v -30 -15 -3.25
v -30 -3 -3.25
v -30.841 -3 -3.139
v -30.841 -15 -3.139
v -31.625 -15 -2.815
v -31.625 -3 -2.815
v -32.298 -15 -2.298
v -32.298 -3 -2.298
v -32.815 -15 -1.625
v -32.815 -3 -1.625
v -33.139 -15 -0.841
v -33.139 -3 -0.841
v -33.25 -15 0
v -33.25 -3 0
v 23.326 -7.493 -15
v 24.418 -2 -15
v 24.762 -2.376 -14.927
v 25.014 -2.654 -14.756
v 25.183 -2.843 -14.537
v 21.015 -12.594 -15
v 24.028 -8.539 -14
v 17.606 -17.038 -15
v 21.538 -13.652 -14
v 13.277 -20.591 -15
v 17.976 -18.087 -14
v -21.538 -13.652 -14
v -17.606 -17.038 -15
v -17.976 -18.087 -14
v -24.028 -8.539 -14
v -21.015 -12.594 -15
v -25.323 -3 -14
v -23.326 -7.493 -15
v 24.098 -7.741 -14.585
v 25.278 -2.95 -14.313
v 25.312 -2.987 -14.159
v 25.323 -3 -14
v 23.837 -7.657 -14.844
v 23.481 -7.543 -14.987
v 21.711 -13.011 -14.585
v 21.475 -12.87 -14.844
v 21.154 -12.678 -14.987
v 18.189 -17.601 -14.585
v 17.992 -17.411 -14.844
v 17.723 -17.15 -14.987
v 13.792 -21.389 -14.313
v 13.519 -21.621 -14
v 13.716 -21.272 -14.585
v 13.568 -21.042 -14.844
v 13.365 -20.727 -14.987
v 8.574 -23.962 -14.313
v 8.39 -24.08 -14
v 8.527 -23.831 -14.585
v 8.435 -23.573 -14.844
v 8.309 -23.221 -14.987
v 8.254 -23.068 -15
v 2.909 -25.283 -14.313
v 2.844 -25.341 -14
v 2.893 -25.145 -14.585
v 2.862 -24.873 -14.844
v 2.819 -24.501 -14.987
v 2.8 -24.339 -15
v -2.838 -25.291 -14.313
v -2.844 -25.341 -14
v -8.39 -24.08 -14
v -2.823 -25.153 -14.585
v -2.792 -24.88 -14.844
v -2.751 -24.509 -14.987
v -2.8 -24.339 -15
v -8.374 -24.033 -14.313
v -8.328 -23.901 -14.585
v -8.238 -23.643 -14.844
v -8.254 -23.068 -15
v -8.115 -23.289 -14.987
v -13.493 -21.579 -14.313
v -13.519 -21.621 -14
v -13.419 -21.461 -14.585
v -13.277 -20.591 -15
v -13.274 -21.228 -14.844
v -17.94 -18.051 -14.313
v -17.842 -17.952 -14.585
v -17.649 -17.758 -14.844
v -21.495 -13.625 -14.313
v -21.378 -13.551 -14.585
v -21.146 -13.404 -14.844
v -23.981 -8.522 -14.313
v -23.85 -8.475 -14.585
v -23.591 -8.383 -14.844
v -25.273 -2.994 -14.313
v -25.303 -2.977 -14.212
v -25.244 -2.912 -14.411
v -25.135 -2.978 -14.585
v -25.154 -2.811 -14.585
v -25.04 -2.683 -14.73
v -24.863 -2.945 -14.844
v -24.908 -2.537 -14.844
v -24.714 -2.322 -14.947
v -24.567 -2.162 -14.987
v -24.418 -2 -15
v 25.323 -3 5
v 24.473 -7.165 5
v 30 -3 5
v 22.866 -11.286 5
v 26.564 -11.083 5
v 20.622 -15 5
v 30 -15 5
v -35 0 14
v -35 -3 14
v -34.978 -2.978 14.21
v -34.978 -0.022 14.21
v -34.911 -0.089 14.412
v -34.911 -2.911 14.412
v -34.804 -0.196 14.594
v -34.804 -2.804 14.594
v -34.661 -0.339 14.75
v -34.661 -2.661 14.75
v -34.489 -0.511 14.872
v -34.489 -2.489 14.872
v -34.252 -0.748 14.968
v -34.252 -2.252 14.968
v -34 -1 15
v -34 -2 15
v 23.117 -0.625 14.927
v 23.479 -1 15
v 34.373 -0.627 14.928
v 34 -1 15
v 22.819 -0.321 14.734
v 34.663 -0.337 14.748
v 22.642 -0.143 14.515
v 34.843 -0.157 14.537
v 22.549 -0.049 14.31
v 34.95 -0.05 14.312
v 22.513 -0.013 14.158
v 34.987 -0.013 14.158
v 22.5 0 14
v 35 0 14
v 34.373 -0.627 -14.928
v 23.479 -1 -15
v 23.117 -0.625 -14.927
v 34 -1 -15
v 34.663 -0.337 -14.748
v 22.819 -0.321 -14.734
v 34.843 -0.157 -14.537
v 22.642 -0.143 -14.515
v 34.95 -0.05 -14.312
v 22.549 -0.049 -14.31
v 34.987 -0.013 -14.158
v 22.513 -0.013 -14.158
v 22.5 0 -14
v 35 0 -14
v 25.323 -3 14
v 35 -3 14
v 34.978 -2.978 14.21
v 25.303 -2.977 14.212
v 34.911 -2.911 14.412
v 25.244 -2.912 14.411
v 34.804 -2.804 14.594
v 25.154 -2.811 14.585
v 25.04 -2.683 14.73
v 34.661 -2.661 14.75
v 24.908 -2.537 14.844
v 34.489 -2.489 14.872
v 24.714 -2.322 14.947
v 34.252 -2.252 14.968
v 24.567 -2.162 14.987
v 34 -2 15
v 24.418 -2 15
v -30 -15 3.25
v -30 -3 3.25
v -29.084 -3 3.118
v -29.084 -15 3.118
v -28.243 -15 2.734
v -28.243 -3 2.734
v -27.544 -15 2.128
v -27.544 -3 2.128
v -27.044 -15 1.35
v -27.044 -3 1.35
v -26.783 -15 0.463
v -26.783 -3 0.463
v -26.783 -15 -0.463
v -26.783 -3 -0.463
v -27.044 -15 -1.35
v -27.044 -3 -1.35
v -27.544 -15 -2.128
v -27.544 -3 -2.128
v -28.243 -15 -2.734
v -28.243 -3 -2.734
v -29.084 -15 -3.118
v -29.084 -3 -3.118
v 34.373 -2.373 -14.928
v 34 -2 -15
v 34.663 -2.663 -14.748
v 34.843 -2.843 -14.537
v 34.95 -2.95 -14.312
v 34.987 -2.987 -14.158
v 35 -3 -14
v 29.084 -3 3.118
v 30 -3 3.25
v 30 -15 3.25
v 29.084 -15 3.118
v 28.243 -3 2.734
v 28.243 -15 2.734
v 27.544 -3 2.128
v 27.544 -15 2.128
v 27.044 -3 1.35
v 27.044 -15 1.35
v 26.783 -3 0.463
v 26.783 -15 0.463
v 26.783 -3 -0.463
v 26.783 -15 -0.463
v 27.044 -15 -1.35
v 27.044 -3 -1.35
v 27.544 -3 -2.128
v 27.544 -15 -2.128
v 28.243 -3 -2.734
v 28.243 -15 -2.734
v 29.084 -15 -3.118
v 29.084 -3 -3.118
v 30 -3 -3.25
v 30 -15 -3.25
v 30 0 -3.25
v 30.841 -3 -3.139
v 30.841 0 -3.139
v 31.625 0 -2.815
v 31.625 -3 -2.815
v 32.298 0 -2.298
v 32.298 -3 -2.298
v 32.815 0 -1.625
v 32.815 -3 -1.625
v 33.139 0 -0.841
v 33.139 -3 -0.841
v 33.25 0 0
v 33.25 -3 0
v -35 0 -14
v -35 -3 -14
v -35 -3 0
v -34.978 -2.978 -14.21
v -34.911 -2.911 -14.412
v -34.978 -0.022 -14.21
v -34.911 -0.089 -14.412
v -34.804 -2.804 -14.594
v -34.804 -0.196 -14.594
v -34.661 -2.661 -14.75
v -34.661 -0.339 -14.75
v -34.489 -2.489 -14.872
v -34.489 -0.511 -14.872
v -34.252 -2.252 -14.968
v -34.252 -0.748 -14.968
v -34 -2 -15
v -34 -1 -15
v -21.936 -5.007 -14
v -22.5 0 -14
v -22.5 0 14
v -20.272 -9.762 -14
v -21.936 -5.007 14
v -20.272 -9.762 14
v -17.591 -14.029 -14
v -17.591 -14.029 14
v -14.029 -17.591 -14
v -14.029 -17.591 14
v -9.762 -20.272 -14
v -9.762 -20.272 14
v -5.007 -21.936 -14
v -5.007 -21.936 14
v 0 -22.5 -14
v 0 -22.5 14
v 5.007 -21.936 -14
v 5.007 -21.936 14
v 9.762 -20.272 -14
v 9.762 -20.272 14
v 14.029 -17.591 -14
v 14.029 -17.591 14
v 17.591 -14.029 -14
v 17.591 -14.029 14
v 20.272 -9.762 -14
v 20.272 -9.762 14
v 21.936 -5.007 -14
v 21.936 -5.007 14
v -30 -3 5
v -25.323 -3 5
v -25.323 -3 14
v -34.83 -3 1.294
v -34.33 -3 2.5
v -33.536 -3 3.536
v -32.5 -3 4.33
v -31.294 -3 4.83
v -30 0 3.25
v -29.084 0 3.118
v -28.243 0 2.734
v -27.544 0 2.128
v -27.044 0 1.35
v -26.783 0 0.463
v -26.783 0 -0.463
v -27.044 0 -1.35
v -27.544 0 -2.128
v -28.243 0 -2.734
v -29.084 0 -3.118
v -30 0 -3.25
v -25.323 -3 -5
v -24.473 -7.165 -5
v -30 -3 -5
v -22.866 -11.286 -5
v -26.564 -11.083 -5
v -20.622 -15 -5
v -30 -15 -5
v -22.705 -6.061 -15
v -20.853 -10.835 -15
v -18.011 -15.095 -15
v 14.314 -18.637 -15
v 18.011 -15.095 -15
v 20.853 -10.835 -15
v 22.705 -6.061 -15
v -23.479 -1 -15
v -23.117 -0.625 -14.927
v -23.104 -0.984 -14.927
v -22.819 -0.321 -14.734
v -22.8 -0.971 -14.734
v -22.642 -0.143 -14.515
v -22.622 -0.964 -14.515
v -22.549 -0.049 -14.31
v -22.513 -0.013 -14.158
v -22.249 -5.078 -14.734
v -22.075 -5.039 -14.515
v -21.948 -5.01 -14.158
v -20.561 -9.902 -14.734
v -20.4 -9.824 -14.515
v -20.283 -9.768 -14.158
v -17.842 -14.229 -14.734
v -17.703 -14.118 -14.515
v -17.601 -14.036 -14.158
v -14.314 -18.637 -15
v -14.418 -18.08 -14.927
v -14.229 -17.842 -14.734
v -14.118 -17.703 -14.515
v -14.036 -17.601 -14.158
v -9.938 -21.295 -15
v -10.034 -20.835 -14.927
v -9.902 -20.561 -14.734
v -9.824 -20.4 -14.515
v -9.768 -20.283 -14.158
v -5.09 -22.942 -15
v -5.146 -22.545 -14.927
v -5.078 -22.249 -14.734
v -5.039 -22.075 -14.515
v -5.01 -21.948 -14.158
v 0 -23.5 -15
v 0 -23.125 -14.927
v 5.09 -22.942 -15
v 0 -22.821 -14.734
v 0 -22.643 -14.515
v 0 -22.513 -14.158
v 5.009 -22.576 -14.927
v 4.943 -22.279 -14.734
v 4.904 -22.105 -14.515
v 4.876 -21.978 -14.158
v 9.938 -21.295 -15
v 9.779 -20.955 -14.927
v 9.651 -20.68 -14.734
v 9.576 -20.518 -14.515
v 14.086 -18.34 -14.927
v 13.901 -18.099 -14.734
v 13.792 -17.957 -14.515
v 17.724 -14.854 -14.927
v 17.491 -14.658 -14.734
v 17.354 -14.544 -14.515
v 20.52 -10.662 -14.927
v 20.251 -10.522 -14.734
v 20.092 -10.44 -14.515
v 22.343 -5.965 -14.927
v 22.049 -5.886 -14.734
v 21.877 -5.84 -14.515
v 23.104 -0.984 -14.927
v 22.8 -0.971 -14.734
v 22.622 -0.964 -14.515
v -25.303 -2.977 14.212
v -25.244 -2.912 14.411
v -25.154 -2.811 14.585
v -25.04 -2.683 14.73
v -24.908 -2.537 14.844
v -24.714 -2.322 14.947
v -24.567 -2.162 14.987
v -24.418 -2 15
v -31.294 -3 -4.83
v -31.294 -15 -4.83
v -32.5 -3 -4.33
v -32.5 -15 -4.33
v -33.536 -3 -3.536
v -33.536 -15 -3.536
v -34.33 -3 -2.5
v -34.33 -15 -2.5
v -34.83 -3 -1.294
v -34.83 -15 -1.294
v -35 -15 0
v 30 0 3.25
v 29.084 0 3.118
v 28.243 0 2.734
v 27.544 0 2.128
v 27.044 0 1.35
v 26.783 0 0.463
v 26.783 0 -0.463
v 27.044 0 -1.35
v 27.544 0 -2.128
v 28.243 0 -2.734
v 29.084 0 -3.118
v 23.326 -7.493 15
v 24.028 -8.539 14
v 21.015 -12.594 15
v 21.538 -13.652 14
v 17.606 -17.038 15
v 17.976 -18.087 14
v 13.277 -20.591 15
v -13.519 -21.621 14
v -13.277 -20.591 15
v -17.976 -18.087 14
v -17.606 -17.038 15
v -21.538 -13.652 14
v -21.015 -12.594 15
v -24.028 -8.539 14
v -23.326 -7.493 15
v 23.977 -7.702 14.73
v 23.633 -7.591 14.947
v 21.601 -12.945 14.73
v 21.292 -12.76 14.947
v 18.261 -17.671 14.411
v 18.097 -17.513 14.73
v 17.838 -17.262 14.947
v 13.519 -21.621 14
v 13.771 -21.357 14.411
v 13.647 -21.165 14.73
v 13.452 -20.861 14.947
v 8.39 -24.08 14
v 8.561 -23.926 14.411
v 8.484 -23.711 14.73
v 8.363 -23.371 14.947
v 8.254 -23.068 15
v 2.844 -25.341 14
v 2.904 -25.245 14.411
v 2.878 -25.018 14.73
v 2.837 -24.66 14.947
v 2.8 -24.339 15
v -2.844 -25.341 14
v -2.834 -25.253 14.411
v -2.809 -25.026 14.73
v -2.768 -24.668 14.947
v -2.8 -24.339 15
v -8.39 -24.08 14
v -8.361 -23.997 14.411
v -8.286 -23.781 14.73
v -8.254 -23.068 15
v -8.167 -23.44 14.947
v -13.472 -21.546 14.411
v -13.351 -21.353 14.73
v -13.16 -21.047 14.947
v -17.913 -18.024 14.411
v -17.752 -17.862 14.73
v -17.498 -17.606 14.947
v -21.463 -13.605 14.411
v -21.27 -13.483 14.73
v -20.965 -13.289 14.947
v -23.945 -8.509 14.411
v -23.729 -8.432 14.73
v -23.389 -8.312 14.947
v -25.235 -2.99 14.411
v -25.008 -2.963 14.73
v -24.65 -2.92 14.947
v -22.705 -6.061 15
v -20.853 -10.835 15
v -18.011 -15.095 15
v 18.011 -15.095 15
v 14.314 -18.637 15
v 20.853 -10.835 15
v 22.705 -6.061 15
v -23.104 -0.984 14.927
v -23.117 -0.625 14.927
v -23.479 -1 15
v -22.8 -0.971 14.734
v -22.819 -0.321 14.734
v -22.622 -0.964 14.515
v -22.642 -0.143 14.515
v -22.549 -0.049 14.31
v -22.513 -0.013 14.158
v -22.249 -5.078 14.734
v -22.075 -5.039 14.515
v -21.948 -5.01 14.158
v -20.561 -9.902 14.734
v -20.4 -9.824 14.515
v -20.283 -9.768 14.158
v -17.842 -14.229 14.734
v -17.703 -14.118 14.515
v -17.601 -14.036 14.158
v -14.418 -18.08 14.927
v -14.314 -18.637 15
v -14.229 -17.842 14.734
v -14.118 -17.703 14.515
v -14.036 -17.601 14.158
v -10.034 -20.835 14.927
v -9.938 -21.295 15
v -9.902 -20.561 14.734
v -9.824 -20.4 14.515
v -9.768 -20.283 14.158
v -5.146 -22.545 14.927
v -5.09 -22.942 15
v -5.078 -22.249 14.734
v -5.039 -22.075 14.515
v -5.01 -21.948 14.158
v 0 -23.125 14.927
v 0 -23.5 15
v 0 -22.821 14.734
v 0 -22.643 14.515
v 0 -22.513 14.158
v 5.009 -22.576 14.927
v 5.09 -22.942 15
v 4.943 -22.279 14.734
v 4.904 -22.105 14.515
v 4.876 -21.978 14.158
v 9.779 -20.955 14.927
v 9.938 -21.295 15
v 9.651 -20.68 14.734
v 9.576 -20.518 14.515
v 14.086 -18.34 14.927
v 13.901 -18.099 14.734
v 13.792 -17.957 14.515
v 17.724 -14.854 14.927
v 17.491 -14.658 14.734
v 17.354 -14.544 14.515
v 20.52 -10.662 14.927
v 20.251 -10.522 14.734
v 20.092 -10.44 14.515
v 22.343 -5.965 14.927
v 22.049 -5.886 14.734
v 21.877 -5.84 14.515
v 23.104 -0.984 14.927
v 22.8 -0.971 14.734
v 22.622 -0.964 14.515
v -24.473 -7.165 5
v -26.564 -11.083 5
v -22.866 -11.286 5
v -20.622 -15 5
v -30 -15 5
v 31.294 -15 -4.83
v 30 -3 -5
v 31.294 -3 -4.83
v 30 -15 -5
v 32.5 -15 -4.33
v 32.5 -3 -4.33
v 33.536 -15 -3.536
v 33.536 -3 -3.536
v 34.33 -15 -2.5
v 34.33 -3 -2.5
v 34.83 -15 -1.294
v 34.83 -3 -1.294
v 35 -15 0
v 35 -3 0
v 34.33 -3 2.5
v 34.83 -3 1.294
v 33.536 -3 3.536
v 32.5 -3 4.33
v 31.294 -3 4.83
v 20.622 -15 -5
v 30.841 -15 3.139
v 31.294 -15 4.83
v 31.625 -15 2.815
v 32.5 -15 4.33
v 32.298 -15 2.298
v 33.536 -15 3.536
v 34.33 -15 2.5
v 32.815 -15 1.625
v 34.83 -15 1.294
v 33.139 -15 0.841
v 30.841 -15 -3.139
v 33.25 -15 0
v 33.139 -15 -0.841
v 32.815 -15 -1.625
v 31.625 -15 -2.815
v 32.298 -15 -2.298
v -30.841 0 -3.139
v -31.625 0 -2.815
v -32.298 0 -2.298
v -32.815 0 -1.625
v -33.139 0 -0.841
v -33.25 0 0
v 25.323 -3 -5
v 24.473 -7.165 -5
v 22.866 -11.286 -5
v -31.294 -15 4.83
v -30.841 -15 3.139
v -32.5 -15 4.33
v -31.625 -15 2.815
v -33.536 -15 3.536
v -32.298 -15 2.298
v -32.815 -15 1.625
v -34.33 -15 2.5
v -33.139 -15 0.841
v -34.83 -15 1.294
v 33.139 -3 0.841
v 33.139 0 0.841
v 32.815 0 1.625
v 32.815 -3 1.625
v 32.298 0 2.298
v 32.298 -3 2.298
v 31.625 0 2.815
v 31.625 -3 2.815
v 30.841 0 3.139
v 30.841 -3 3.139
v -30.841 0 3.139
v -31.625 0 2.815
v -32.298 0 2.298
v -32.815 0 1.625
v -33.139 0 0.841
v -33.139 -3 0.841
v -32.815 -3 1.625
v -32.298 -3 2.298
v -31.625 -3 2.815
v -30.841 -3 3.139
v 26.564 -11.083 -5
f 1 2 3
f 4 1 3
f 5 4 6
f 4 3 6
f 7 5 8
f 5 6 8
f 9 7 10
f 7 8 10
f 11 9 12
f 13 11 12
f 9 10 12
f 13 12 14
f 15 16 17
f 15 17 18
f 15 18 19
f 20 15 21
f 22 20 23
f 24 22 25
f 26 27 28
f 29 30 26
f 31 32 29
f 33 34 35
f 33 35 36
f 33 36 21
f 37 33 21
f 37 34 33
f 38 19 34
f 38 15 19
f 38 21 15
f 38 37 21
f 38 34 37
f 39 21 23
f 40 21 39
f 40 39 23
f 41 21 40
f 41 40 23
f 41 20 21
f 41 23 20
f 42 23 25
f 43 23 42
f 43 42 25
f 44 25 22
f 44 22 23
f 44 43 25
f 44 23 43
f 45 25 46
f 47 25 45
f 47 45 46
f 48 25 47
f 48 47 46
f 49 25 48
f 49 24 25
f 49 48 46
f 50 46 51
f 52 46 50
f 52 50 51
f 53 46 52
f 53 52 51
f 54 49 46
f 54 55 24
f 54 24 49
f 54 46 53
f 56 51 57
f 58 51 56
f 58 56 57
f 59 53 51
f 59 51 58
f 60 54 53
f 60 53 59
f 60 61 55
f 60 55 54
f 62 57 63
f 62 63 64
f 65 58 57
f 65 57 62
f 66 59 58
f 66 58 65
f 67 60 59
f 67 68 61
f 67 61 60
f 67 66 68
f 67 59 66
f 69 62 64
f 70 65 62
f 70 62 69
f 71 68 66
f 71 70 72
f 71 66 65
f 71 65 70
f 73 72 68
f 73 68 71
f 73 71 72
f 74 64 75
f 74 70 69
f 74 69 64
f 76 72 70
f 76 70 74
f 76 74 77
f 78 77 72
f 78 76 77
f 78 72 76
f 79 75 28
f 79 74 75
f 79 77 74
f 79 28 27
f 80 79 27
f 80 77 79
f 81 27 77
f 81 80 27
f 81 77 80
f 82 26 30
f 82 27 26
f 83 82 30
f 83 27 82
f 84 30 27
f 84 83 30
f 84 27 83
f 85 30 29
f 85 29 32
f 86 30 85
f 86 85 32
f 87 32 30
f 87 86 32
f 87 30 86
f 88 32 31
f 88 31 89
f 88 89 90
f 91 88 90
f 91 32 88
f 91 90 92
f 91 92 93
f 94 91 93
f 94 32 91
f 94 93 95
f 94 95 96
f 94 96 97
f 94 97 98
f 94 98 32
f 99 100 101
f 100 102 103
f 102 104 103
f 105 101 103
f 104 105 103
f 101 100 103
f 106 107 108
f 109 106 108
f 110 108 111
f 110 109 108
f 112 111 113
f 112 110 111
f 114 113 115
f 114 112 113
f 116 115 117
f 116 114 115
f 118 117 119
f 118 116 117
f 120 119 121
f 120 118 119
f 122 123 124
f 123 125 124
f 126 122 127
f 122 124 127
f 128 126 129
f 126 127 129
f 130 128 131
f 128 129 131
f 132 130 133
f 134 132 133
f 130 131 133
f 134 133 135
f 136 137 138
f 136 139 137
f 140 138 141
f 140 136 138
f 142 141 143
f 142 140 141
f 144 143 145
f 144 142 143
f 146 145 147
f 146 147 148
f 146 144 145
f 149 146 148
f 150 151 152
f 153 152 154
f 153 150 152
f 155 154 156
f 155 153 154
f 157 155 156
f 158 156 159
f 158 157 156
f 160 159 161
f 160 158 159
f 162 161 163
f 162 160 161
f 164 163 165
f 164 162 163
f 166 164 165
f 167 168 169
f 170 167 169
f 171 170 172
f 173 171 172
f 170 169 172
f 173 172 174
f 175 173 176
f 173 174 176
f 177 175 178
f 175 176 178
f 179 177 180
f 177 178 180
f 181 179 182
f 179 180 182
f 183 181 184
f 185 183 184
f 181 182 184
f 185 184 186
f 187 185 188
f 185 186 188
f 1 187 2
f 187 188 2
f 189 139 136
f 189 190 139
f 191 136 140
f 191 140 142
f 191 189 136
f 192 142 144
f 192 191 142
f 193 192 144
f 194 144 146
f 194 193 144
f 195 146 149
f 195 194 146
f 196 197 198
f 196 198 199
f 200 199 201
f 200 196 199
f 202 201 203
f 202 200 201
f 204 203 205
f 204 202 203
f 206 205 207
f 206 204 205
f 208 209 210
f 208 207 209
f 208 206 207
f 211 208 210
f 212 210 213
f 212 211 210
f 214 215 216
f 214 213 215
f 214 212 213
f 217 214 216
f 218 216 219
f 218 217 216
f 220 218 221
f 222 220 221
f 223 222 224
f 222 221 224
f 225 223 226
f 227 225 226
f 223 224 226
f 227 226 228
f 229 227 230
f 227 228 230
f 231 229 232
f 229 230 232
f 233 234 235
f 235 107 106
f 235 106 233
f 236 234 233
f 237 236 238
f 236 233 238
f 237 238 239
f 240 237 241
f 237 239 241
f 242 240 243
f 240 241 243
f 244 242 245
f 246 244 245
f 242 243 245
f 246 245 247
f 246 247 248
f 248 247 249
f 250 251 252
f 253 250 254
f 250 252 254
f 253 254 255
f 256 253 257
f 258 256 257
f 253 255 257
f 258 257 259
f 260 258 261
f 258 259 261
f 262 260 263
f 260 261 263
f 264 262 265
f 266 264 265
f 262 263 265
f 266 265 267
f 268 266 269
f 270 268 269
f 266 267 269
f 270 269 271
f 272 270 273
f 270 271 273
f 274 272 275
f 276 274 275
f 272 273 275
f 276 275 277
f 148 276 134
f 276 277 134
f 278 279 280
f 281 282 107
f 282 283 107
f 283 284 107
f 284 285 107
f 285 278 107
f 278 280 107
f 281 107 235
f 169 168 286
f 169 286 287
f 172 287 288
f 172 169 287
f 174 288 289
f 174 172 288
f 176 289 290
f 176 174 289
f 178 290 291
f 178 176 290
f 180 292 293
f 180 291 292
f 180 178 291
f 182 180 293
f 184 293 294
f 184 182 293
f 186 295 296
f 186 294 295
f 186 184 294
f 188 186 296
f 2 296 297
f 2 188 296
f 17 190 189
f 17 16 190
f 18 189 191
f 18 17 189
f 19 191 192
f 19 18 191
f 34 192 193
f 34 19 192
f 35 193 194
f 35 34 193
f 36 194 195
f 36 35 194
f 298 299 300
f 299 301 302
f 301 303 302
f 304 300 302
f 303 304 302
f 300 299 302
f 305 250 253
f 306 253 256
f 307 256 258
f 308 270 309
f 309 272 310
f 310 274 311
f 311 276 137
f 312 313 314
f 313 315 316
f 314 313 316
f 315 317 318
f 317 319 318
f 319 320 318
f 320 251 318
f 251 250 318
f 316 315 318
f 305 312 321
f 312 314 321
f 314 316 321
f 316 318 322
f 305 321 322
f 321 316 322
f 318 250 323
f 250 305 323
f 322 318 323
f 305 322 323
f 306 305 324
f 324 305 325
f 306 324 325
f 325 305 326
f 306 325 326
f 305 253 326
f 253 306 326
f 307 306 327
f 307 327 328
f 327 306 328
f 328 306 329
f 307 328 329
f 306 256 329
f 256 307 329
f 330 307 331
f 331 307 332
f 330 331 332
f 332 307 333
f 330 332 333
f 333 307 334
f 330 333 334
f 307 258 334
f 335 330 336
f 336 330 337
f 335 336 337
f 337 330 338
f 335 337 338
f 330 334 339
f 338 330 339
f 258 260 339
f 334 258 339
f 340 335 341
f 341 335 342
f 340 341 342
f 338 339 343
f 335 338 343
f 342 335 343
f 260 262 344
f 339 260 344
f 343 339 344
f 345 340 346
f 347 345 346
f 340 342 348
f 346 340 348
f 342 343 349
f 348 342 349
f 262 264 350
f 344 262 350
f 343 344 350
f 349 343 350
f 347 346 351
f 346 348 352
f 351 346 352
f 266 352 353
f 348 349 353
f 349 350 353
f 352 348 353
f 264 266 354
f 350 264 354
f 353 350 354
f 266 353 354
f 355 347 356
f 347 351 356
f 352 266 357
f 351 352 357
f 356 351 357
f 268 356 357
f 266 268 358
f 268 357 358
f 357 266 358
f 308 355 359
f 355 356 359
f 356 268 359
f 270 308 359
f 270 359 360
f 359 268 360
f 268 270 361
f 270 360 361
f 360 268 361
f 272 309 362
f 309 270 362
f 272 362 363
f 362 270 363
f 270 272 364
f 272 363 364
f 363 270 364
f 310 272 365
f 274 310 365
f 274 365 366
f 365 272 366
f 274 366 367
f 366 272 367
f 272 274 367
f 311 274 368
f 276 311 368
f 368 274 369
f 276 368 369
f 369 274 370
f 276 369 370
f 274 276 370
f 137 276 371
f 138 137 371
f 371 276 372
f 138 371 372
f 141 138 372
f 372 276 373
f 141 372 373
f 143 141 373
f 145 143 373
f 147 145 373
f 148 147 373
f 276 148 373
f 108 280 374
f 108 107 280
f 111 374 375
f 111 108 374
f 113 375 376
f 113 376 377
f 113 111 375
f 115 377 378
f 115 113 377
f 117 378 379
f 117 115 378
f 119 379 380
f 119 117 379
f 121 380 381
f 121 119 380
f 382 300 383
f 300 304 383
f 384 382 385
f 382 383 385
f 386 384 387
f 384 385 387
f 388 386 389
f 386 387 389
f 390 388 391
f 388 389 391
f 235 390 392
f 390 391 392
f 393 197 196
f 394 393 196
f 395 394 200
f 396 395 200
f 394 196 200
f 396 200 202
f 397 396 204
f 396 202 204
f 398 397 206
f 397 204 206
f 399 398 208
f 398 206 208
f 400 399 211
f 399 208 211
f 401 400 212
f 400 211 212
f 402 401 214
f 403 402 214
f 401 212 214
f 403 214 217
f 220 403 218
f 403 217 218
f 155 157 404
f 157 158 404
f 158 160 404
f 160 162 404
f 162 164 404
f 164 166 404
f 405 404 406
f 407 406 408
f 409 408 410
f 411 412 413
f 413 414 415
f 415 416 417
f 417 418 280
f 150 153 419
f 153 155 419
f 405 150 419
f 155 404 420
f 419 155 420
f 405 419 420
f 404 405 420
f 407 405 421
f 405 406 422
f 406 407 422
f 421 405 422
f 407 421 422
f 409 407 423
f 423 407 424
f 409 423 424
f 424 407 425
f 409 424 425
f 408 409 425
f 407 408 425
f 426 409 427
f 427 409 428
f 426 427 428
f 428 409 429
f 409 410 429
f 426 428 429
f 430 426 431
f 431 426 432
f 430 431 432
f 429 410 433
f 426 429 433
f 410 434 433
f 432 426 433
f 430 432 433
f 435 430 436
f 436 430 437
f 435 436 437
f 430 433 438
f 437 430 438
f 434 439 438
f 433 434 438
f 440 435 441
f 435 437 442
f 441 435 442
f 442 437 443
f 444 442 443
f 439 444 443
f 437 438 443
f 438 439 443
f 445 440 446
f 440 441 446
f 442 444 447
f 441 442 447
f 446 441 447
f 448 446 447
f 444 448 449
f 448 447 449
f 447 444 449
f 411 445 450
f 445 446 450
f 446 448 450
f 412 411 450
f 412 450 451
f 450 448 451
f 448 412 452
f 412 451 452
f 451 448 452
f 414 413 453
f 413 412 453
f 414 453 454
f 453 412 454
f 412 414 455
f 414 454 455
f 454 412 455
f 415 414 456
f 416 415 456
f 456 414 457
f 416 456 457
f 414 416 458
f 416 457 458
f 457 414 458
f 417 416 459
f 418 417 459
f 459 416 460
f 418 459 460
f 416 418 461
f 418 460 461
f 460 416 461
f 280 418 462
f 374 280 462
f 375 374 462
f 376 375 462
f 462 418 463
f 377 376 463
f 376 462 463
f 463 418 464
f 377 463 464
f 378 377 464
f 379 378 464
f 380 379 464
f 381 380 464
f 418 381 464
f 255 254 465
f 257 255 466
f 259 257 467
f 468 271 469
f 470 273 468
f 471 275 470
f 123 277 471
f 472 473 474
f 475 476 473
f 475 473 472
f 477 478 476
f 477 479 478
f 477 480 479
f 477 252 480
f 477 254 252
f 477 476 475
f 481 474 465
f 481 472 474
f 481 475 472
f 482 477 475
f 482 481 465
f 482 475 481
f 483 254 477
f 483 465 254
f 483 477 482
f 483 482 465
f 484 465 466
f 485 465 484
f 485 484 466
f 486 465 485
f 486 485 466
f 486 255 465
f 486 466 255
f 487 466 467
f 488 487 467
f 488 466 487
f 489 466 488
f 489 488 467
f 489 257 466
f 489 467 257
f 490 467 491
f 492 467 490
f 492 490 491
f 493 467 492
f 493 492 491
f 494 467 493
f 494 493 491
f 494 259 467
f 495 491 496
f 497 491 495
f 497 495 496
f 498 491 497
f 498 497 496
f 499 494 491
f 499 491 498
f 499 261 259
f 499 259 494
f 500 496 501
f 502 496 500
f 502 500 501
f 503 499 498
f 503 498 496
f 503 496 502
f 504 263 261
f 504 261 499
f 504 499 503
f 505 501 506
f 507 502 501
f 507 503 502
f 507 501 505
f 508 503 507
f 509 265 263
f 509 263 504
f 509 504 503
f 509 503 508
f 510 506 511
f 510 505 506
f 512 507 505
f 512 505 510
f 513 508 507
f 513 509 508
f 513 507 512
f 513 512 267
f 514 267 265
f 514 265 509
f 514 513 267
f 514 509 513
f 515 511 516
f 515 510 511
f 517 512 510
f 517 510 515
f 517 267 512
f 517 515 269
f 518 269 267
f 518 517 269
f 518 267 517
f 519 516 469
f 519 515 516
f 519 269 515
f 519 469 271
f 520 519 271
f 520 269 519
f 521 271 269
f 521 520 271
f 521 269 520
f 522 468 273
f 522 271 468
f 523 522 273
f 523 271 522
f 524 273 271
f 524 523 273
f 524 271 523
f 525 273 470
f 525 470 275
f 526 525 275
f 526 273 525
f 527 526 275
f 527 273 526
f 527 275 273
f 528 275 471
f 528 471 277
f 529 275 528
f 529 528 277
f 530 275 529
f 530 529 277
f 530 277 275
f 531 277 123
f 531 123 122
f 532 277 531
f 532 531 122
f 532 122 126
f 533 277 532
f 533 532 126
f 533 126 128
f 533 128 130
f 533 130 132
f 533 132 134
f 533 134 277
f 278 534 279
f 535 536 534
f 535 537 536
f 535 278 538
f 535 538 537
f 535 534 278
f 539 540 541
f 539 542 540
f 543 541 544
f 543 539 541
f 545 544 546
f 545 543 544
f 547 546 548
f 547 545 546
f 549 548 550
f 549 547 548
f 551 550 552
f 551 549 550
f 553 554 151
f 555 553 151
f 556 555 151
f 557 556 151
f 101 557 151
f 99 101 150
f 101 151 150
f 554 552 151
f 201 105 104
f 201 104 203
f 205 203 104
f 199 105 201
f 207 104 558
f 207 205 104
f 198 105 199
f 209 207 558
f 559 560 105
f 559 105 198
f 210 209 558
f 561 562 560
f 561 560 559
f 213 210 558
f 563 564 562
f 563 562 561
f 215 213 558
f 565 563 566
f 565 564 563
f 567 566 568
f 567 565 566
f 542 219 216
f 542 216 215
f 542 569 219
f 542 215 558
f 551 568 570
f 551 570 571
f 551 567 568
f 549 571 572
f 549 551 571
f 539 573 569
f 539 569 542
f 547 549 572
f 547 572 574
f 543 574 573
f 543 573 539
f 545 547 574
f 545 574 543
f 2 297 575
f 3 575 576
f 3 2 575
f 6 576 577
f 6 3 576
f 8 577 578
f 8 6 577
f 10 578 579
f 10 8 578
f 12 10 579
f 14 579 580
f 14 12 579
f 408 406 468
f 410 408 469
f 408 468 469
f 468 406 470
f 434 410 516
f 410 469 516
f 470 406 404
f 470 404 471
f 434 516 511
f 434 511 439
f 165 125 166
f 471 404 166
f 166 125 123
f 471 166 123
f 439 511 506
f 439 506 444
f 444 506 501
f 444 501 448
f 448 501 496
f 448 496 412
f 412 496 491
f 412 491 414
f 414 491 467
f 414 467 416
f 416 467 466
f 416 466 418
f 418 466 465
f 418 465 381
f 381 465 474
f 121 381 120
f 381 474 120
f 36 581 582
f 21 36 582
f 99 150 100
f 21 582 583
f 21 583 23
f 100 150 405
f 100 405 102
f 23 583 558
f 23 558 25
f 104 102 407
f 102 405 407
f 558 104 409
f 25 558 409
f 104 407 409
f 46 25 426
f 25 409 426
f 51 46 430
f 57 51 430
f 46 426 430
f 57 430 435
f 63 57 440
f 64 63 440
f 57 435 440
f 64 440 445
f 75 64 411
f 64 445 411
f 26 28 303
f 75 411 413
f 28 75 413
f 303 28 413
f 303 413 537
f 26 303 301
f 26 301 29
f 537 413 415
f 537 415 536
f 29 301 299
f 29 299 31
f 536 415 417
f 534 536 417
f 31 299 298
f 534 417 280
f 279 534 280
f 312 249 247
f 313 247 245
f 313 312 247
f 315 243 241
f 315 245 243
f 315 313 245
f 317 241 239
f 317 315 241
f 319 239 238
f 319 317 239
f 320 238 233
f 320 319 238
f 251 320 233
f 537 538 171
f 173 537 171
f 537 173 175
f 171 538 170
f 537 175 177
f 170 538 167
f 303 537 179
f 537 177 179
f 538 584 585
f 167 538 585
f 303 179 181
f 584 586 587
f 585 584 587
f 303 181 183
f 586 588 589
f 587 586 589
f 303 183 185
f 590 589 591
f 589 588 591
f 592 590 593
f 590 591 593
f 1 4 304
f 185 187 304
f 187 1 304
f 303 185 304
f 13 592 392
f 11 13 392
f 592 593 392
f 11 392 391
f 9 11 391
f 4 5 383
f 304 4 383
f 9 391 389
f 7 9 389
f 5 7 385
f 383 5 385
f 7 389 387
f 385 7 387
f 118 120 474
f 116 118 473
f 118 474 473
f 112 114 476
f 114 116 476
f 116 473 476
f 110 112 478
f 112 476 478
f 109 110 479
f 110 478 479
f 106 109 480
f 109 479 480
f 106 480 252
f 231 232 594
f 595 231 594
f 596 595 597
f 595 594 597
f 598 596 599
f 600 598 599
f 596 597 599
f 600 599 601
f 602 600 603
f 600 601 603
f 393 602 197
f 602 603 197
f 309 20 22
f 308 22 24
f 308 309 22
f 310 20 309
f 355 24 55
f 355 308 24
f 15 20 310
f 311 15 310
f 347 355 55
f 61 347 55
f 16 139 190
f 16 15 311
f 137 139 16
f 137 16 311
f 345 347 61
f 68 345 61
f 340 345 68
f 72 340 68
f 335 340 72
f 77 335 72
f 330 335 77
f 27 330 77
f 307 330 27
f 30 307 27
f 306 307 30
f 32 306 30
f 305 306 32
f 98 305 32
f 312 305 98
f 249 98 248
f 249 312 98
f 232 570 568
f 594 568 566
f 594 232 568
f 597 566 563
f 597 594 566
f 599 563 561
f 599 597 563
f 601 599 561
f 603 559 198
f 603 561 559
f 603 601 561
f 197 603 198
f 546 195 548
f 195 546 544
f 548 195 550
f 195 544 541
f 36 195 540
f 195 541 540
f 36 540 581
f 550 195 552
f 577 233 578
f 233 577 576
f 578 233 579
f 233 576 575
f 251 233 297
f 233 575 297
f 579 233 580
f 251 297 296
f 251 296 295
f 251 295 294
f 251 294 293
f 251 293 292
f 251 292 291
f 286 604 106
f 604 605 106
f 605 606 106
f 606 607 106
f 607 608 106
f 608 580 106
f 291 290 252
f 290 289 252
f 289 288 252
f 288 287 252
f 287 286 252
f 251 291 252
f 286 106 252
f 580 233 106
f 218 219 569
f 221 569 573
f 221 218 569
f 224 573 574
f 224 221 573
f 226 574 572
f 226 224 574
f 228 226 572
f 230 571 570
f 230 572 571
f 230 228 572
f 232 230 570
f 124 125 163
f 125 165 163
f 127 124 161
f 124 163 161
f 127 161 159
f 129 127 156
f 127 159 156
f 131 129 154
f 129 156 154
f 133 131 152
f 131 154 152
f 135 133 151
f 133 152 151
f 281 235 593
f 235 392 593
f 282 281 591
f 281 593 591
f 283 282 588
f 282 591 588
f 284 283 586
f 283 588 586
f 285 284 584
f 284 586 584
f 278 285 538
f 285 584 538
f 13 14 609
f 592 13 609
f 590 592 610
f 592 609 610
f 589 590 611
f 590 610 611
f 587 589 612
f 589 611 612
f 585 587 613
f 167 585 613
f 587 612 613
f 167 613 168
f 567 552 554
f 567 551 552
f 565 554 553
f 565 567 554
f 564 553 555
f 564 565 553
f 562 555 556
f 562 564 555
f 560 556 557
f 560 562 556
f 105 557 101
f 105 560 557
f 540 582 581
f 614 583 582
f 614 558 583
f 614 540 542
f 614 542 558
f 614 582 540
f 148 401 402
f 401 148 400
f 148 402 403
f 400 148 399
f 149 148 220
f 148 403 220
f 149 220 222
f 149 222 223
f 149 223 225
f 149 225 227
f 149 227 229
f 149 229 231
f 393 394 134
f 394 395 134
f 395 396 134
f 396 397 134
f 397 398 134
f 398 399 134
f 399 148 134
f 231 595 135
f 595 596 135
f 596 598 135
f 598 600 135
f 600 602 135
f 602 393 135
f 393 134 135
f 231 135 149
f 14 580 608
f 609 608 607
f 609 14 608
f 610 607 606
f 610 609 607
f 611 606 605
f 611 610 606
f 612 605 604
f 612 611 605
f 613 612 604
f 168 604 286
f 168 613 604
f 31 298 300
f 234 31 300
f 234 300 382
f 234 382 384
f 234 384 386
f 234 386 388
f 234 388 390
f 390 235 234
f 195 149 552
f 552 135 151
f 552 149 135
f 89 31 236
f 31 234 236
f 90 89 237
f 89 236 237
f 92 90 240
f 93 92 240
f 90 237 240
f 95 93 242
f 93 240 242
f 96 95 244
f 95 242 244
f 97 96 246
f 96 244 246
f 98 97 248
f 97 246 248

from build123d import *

# Parameters (mm, degrees)
BOSS_EXTRUDE1_DEPTH = 15
BOSS_EXTRUDE2_REACH = 58.23
BOSS_EXTRUDE2_START = 12
SKETCH2_3_R         = 3.25
CUT_EXTRUDE1_DEPTH  = 45.229515032
FILLET1_R           = 1


with BuildPart() as part:
    # Sketch1 → Boss-Extrude1 (new, symmetric)
    with BuildSketch(Plane.XY):
        with BuildLine():
            Line((-35, 0), (-22.5, 0))
            ThreePointArc((-22.5, 0), (0, -22.5), (22.5, 0))
            Line((22.5, 0), (35, 0))
            Line((35, 0), (35, -3))
            Line((35, -3), (25.322914524, -3))
            ThreePointArc((25.322914524, -3), (0, -25.5), (-25.322914524, -3))
            Line((-25.322914524, -3), (-35, -3))
            Line((-35, -3), (-35, 0))
        make_face()
    extrude(amount=BOSS_EXTRUDE1_DEPTH, both=True)

    # Sketch2 → Boss-Extrude2 (add, up to next)
    with BuildSketch(Plane.XZ.offset(3).offset(BOSS_EXTRUDE2_START), mode=Mode.PRIVATE) as boss_extrude2_sk1:
        with BuildLine():
            Line((18, 5), (18, -5))
            Line((18, -5), (30, -5))
            ThreePointArc((30, -5), (35, 0), (30, 5))
            Line((30, 5), (18, 5))
        make_face()
    boss_extrude2_tool1 = extrude(boss_extrude2_sk1.sketch, amount=-BOSS_EXTRUDE2_REACH, mode=Mode.PRIVATE) - part.part
    boss_extrude2 = boss_extrude2_tool1.solids().sort_by_distance((26.002593, -15, 0))[0]
    add(boss_extrude2)

    # Sketch2<3> → Cut-Extrude1 (cut, symmetric)
    with BuildSketch(Plane.XZ.offset(3)):
        with Locations((30, 0)):
            Circle(SKETCH2_3_R)
    cut_extrude1 = extrude(amount=CUT_EXTRUDE1_DEPTH, both=True, mode=Mode.SUBTRACT)

    # Mirror1: Boss-Extrude2, Cut-Extrude1 across plane
    add(boss_extrude2.mirror(Plane(origin=(0, 0, 0), x_dir=(0, 0, 1), z_dir=(1, 0, 0))))
    add(cut_extrude1.mirror(Plane(origin=(0, 0, 0), x_dir=(0, 0, 1), z_dir=(1, 0, 0))), mode=Mode.SUBTRACT)

    # Fillet1
    fillet1_edges = [part.edges().sort_by_distance(p)[0] for p in [
        (28.75, 0, 15),
        (35, -1.5, 15),
        (30.161457262, -3, 15),
        (0, -25.5, 15),
        (-30.161457262, -3, 15),
        (-35, -1.5, 15),
        (-28.75, 0, 15),
        (0, -22.5, 15),
        (-28.75, 0, -15),
        (-35, -1.5, -15),
        (-30.161457262, -3, -15),
        (0, -25.5, -15),
        (30.161457262, -3, -15),
        (35, -1.5, -15),
        (28.75, 0, -15),
        (0, -22.5, -15),
    ]]
    fillet(fillet1_edges, radius=FILLET1_R)


solid = part.part
